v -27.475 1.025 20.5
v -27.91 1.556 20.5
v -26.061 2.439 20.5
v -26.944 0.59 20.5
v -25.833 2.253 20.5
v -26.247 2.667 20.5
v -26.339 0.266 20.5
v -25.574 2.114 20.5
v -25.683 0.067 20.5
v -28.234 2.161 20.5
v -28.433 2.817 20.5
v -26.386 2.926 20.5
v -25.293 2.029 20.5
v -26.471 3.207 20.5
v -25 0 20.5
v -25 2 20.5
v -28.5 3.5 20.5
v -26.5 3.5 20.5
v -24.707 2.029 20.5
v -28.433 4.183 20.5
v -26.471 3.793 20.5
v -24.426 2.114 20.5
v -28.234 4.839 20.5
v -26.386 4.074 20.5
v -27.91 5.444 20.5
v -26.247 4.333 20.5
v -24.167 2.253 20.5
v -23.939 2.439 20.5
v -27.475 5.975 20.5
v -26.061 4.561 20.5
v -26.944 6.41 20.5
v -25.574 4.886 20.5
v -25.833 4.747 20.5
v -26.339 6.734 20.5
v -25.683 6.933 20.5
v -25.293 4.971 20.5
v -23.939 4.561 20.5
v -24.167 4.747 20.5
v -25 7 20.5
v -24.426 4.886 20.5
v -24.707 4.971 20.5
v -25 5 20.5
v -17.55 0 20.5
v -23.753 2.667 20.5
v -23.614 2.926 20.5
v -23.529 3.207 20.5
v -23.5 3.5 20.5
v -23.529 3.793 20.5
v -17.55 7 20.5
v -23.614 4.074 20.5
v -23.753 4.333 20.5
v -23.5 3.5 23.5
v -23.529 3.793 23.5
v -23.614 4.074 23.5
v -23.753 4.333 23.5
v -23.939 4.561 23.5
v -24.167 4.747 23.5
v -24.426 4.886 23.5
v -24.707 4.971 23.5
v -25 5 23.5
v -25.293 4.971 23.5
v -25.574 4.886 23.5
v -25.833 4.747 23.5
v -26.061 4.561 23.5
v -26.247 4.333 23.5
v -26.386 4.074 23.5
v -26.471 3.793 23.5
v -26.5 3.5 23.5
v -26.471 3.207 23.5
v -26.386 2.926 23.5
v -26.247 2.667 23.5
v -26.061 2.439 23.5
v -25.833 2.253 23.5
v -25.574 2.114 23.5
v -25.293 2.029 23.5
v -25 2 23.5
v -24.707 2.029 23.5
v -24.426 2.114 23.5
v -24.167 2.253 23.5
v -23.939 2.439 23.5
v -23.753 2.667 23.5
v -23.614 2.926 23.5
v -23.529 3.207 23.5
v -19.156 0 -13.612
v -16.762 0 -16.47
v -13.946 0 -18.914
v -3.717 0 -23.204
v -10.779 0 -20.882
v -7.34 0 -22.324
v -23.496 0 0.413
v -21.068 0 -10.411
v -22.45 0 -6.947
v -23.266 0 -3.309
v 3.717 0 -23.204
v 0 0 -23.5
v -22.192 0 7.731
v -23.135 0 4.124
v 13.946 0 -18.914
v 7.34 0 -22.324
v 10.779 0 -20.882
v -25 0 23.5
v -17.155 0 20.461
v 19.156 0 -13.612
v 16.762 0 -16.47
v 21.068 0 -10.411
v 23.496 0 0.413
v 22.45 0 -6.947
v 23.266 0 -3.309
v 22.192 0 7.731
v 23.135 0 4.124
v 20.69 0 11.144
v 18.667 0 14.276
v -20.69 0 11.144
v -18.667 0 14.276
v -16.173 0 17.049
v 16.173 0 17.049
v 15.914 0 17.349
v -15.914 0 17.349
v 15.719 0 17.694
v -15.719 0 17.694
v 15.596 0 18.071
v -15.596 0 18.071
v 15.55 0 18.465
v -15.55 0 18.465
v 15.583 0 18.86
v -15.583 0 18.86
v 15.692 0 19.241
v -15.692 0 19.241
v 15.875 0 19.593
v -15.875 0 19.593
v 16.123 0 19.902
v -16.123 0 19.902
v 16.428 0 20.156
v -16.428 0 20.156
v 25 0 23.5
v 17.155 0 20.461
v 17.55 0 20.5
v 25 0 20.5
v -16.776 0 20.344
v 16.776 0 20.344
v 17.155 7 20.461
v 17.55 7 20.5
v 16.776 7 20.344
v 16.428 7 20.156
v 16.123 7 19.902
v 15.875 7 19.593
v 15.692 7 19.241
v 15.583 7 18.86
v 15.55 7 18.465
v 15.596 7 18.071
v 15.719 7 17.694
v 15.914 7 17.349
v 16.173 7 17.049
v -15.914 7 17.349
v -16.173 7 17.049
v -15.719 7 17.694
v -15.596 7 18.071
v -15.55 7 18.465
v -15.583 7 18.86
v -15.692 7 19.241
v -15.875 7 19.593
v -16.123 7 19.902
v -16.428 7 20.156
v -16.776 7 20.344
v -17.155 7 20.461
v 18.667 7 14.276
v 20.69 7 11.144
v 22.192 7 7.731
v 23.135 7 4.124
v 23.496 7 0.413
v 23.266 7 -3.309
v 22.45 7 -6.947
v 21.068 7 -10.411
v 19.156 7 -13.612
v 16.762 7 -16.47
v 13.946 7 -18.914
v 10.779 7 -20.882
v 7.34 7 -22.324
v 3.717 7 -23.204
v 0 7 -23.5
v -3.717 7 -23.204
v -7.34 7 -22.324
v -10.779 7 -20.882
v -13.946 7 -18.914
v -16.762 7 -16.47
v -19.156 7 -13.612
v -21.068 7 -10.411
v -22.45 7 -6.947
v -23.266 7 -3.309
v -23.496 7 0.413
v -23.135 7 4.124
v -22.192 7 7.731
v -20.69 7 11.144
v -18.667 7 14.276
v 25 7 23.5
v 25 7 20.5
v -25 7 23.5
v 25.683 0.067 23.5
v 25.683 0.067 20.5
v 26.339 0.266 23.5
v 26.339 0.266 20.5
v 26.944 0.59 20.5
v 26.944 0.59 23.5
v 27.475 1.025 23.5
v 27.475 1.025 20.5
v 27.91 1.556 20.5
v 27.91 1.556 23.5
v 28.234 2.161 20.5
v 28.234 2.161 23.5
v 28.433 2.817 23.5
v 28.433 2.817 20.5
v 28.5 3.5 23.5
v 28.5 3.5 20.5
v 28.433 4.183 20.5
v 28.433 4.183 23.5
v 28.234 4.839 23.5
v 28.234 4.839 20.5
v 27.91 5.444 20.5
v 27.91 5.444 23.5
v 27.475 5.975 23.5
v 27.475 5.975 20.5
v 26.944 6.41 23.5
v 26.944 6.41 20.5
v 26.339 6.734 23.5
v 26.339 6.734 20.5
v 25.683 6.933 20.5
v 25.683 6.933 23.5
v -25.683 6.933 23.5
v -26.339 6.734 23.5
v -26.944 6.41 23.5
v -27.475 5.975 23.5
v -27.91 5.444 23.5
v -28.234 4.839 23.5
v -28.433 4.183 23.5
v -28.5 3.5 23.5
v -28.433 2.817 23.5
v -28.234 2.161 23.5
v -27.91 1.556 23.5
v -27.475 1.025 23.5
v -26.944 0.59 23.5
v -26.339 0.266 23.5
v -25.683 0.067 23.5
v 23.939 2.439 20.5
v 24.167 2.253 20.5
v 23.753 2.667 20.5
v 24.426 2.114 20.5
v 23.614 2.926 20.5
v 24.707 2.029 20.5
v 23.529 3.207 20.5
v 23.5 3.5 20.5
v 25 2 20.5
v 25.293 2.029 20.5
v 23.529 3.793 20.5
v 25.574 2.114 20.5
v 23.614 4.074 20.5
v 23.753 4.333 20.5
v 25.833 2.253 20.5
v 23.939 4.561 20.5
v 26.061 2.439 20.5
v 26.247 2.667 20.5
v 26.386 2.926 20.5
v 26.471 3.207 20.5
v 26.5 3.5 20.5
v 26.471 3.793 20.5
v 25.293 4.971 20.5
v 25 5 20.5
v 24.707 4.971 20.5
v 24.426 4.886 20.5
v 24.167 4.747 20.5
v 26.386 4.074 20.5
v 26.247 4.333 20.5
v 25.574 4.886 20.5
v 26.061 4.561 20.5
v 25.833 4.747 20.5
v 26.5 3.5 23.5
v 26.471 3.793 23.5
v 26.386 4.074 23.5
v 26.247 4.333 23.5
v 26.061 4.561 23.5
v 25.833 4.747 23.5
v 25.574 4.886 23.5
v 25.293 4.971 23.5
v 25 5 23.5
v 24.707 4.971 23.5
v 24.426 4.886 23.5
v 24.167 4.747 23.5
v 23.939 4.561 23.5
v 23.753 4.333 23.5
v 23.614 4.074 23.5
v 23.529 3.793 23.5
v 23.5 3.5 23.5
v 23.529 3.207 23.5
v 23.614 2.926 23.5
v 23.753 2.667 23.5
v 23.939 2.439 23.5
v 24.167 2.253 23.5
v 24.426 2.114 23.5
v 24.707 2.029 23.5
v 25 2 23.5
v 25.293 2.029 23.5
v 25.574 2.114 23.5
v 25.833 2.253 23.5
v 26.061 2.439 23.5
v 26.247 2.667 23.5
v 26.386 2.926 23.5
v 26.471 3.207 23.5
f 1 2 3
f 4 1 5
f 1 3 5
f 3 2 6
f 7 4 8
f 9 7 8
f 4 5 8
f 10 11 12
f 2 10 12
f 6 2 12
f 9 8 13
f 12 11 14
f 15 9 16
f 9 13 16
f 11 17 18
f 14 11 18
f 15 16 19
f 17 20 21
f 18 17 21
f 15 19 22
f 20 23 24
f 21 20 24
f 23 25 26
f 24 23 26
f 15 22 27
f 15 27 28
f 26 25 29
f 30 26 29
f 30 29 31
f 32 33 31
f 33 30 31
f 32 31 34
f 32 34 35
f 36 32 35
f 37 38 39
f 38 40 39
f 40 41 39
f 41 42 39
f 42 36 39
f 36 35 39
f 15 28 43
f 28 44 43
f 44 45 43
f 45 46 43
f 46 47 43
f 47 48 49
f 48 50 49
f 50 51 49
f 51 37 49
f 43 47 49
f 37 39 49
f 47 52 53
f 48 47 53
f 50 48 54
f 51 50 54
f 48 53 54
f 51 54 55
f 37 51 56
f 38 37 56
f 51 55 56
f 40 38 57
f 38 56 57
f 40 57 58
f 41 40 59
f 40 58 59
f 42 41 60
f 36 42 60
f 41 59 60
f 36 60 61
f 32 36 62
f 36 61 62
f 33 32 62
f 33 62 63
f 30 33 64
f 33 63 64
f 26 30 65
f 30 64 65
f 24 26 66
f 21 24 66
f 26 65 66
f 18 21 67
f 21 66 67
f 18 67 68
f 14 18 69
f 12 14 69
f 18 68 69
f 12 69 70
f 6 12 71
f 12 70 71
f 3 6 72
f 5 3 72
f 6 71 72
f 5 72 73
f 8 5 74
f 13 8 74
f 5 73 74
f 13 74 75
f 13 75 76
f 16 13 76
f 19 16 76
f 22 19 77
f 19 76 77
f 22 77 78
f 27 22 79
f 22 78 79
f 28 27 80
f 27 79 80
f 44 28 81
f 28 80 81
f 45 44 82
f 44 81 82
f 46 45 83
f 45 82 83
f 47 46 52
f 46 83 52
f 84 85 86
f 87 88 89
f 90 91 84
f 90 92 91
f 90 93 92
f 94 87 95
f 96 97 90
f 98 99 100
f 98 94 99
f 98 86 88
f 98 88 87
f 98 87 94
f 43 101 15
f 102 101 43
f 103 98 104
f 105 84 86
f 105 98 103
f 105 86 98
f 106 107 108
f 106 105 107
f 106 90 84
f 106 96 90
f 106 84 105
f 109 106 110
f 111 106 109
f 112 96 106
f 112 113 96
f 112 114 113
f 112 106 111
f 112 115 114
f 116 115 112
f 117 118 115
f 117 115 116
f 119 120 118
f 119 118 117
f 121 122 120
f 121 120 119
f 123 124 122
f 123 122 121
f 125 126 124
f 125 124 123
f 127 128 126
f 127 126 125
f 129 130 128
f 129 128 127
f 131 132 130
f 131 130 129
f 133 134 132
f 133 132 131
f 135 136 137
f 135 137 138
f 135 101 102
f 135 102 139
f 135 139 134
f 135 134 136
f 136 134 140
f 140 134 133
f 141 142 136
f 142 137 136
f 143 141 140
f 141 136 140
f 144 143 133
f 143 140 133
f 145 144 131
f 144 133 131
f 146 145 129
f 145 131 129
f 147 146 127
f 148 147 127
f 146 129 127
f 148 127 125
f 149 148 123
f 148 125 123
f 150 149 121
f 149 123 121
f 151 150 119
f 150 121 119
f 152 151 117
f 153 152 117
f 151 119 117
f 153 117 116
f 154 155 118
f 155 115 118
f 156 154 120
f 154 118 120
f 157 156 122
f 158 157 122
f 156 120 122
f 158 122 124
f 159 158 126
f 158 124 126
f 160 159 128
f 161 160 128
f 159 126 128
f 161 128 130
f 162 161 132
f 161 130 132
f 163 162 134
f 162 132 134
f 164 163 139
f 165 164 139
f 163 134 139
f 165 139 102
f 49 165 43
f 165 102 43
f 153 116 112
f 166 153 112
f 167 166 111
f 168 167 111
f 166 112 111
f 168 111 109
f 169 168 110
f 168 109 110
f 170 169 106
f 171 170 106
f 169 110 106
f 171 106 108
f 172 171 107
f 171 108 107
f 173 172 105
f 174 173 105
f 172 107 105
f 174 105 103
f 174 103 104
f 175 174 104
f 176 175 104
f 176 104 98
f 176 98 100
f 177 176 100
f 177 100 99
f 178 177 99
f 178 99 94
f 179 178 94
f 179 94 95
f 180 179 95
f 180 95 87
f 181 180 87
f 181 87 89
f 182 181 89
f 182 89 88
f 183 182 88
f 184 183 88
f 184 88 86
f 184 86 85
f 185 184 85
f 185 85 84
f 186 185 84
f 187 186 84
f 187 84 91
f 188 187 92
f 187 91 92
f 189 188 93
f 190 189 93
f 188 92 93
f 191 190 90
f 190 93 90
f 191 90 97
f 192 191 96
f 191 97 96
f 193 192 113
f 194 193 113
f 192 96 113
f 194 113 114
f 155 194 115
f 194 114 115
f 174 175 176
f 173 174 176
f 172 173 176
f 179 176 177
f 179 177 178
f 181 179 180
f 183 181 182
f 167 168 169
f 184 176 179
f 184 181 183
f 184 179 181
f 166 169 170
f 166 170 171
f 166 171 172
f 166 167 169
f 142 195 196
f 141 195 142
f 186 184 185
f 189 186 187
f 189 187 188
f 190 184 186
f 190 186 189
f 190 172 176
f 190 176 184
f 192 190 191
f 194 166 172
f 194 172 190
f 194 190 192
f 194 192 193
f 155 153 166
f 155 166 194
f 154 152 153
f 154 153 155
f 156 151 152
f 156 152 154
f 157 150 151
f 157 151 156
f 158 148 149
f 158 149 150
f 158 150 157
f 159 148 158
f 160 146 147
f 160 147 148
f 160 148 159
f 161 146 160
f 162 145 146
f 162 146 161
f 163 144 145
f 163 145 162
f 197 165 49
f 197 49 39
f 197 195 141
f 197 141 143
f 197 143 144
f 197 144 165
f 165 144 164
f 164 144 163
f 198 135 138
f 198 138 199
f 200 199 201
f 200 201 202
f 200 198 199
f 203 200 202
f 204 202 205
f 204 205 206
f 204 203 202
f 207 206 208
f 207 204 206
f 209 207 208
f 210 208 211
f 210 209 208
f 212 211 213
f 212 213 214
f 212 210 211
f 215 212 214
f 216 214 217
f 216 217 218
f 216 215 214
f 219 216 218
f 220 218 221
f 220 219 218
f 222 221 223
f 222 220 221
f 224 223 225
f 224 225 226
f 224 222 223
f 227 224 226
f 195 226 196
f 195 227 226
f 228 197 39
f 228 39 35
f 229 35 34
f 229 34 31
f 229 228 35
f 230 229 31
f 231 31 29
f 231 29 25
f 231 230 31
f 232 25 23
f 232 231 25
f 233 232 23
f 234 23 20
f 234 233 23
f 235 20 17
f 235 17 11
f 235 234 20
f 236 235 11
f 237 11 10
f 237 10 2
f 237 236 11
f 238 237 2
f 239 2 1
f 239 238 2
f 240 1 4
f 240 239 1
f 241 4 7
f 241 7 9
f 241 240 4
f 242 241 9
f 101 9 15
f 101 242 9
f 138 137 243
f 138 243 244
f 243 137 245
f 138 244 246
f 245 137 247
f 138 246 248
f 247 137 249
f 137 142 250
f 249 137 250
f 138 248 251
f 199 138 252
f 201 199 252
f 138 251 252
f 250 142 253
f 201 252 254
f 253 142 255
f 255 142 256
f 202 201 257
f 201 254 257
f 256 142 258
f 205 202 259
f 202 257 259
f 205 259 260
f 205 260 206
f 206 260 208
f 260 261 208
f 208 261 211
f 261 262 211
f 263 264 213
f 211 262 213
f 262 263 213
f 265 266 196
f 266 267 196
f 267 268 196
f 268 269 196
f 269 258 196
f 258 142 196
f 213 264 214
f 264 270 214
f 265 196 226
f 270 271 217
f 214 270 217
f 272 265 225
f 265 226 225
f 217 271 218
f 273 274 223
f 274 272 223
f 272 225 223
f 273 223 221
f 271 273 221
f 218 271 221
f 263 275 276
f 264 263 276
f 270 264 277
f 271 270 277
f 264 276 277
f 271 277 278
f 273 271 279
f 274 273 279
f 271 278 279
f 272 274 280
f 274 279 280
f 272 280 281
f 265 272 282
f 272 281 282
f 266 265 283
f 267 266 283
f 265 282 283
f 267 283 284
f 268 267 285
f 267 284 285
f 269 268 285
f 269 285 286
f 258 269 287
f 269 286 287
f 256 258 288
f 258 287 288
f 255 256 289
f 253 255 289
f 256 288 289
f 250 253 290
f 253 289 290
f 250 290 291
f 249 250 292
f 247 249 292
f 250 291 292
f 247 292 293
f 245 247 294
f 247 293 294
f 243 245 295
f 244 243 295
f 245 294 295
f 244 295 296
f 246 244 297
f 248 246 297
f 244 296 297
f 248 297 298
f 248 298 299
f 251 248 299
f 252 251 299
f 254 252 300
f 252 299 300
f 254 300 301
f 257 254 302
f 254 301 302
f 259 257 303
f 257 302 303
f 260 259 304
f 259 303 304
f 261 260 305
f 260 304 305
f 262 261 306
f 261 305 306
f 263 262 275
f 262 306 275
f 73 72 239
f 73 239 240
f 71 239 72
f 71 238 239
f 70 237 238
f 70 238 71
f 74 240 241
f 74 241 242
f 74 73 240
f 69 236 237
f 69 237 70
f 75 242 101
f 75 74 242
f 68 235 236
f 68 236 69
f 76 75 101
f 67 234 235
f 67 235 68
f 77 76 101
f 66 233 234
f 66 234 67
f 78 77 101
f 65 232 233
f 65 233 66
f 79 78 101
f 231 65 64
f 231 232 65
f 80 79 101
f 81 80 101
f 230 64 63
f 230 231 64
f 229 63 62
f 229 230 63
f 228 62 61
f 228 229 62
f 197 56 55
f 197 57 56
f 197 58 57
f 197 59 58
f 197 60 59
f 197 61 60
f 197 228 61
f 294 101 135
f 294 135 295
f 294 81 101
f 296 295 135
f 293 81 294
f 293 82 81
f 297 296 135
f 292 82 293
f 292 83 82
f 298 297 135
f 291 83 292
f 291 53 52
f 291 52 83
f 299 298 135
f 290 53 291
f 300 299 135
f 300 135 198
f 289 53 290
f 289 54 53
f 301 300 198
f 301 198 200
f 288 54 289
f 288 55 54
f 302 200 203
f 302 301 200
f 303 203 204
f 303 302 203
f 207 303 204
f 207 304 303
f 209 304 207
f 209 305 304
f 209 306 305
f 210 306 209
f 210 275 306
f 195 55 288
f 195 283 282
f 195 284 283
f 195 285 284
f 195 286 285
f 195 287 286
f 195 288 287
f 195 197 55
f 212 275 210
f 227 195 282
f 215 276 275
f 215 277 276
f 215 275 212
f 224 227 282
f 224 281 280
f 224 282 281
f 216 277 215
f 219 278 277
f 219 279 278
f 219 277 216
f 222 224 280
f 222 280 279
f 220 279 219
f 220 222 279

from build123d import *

# Parameters (mm, degrees)
SKETCH1_R           = 23.5
BOSS_EXTRUDE1_DEPTH = 7
SKETCH2_R           = 1.5
BOSS_EXTRUDE2_DEPTH = 3
FILLET1_R           = 2


with BuildPart() as part:
    # Sketch1 → Boss-Extrude1 (new body)
    with BuildSketch(Plane(origin=(0, 0, 0), x_dir=(1, 0, 0), z_dir=(0, 1, 0))):
        with Locations(Location((0, 0, 0), (0, 0, 270))):
            Circle(SKETCH1_R)
    extrude(amount=BOSS_EXTRUDE1_DEPTH)

    # Sketch2 → Boss-Extrude2 (add)
    with BuildSketch(Plane.XY.offset(23.5)):
        with BuildLine():
            Line((-25, 0), (25, 0))
            ThreePointArc((25, 0), (28.5, 3.5), (25, 7))
            Line((25, 7), (-25, 7))
            ThreePointArc((-25, 7), (-28.5, 3.5), (-25, 0))
        make_face()
        with Locations((25, 3.5)):
            Circle(SKETCH2_R, mode=Mode.SUBTRACT)
        with Locations((-25, 3.5)):
            Circle(SKETCH2_R, mode=Mode.SUBTRACT)
    extrude(amount=-BOSS_EXTRUDE2_DEPTH)

    # Fillet1
    fillet1_edges = [part.edges().sort_by_distance(p)[0] for p in [
        (-11.489125293, 3.5, 20.5),
        (11.489125293, 3.5, 20.5),
    ]]
    fillet(fillet1_edges, radius=FILLET1_R)


solid = part.part
